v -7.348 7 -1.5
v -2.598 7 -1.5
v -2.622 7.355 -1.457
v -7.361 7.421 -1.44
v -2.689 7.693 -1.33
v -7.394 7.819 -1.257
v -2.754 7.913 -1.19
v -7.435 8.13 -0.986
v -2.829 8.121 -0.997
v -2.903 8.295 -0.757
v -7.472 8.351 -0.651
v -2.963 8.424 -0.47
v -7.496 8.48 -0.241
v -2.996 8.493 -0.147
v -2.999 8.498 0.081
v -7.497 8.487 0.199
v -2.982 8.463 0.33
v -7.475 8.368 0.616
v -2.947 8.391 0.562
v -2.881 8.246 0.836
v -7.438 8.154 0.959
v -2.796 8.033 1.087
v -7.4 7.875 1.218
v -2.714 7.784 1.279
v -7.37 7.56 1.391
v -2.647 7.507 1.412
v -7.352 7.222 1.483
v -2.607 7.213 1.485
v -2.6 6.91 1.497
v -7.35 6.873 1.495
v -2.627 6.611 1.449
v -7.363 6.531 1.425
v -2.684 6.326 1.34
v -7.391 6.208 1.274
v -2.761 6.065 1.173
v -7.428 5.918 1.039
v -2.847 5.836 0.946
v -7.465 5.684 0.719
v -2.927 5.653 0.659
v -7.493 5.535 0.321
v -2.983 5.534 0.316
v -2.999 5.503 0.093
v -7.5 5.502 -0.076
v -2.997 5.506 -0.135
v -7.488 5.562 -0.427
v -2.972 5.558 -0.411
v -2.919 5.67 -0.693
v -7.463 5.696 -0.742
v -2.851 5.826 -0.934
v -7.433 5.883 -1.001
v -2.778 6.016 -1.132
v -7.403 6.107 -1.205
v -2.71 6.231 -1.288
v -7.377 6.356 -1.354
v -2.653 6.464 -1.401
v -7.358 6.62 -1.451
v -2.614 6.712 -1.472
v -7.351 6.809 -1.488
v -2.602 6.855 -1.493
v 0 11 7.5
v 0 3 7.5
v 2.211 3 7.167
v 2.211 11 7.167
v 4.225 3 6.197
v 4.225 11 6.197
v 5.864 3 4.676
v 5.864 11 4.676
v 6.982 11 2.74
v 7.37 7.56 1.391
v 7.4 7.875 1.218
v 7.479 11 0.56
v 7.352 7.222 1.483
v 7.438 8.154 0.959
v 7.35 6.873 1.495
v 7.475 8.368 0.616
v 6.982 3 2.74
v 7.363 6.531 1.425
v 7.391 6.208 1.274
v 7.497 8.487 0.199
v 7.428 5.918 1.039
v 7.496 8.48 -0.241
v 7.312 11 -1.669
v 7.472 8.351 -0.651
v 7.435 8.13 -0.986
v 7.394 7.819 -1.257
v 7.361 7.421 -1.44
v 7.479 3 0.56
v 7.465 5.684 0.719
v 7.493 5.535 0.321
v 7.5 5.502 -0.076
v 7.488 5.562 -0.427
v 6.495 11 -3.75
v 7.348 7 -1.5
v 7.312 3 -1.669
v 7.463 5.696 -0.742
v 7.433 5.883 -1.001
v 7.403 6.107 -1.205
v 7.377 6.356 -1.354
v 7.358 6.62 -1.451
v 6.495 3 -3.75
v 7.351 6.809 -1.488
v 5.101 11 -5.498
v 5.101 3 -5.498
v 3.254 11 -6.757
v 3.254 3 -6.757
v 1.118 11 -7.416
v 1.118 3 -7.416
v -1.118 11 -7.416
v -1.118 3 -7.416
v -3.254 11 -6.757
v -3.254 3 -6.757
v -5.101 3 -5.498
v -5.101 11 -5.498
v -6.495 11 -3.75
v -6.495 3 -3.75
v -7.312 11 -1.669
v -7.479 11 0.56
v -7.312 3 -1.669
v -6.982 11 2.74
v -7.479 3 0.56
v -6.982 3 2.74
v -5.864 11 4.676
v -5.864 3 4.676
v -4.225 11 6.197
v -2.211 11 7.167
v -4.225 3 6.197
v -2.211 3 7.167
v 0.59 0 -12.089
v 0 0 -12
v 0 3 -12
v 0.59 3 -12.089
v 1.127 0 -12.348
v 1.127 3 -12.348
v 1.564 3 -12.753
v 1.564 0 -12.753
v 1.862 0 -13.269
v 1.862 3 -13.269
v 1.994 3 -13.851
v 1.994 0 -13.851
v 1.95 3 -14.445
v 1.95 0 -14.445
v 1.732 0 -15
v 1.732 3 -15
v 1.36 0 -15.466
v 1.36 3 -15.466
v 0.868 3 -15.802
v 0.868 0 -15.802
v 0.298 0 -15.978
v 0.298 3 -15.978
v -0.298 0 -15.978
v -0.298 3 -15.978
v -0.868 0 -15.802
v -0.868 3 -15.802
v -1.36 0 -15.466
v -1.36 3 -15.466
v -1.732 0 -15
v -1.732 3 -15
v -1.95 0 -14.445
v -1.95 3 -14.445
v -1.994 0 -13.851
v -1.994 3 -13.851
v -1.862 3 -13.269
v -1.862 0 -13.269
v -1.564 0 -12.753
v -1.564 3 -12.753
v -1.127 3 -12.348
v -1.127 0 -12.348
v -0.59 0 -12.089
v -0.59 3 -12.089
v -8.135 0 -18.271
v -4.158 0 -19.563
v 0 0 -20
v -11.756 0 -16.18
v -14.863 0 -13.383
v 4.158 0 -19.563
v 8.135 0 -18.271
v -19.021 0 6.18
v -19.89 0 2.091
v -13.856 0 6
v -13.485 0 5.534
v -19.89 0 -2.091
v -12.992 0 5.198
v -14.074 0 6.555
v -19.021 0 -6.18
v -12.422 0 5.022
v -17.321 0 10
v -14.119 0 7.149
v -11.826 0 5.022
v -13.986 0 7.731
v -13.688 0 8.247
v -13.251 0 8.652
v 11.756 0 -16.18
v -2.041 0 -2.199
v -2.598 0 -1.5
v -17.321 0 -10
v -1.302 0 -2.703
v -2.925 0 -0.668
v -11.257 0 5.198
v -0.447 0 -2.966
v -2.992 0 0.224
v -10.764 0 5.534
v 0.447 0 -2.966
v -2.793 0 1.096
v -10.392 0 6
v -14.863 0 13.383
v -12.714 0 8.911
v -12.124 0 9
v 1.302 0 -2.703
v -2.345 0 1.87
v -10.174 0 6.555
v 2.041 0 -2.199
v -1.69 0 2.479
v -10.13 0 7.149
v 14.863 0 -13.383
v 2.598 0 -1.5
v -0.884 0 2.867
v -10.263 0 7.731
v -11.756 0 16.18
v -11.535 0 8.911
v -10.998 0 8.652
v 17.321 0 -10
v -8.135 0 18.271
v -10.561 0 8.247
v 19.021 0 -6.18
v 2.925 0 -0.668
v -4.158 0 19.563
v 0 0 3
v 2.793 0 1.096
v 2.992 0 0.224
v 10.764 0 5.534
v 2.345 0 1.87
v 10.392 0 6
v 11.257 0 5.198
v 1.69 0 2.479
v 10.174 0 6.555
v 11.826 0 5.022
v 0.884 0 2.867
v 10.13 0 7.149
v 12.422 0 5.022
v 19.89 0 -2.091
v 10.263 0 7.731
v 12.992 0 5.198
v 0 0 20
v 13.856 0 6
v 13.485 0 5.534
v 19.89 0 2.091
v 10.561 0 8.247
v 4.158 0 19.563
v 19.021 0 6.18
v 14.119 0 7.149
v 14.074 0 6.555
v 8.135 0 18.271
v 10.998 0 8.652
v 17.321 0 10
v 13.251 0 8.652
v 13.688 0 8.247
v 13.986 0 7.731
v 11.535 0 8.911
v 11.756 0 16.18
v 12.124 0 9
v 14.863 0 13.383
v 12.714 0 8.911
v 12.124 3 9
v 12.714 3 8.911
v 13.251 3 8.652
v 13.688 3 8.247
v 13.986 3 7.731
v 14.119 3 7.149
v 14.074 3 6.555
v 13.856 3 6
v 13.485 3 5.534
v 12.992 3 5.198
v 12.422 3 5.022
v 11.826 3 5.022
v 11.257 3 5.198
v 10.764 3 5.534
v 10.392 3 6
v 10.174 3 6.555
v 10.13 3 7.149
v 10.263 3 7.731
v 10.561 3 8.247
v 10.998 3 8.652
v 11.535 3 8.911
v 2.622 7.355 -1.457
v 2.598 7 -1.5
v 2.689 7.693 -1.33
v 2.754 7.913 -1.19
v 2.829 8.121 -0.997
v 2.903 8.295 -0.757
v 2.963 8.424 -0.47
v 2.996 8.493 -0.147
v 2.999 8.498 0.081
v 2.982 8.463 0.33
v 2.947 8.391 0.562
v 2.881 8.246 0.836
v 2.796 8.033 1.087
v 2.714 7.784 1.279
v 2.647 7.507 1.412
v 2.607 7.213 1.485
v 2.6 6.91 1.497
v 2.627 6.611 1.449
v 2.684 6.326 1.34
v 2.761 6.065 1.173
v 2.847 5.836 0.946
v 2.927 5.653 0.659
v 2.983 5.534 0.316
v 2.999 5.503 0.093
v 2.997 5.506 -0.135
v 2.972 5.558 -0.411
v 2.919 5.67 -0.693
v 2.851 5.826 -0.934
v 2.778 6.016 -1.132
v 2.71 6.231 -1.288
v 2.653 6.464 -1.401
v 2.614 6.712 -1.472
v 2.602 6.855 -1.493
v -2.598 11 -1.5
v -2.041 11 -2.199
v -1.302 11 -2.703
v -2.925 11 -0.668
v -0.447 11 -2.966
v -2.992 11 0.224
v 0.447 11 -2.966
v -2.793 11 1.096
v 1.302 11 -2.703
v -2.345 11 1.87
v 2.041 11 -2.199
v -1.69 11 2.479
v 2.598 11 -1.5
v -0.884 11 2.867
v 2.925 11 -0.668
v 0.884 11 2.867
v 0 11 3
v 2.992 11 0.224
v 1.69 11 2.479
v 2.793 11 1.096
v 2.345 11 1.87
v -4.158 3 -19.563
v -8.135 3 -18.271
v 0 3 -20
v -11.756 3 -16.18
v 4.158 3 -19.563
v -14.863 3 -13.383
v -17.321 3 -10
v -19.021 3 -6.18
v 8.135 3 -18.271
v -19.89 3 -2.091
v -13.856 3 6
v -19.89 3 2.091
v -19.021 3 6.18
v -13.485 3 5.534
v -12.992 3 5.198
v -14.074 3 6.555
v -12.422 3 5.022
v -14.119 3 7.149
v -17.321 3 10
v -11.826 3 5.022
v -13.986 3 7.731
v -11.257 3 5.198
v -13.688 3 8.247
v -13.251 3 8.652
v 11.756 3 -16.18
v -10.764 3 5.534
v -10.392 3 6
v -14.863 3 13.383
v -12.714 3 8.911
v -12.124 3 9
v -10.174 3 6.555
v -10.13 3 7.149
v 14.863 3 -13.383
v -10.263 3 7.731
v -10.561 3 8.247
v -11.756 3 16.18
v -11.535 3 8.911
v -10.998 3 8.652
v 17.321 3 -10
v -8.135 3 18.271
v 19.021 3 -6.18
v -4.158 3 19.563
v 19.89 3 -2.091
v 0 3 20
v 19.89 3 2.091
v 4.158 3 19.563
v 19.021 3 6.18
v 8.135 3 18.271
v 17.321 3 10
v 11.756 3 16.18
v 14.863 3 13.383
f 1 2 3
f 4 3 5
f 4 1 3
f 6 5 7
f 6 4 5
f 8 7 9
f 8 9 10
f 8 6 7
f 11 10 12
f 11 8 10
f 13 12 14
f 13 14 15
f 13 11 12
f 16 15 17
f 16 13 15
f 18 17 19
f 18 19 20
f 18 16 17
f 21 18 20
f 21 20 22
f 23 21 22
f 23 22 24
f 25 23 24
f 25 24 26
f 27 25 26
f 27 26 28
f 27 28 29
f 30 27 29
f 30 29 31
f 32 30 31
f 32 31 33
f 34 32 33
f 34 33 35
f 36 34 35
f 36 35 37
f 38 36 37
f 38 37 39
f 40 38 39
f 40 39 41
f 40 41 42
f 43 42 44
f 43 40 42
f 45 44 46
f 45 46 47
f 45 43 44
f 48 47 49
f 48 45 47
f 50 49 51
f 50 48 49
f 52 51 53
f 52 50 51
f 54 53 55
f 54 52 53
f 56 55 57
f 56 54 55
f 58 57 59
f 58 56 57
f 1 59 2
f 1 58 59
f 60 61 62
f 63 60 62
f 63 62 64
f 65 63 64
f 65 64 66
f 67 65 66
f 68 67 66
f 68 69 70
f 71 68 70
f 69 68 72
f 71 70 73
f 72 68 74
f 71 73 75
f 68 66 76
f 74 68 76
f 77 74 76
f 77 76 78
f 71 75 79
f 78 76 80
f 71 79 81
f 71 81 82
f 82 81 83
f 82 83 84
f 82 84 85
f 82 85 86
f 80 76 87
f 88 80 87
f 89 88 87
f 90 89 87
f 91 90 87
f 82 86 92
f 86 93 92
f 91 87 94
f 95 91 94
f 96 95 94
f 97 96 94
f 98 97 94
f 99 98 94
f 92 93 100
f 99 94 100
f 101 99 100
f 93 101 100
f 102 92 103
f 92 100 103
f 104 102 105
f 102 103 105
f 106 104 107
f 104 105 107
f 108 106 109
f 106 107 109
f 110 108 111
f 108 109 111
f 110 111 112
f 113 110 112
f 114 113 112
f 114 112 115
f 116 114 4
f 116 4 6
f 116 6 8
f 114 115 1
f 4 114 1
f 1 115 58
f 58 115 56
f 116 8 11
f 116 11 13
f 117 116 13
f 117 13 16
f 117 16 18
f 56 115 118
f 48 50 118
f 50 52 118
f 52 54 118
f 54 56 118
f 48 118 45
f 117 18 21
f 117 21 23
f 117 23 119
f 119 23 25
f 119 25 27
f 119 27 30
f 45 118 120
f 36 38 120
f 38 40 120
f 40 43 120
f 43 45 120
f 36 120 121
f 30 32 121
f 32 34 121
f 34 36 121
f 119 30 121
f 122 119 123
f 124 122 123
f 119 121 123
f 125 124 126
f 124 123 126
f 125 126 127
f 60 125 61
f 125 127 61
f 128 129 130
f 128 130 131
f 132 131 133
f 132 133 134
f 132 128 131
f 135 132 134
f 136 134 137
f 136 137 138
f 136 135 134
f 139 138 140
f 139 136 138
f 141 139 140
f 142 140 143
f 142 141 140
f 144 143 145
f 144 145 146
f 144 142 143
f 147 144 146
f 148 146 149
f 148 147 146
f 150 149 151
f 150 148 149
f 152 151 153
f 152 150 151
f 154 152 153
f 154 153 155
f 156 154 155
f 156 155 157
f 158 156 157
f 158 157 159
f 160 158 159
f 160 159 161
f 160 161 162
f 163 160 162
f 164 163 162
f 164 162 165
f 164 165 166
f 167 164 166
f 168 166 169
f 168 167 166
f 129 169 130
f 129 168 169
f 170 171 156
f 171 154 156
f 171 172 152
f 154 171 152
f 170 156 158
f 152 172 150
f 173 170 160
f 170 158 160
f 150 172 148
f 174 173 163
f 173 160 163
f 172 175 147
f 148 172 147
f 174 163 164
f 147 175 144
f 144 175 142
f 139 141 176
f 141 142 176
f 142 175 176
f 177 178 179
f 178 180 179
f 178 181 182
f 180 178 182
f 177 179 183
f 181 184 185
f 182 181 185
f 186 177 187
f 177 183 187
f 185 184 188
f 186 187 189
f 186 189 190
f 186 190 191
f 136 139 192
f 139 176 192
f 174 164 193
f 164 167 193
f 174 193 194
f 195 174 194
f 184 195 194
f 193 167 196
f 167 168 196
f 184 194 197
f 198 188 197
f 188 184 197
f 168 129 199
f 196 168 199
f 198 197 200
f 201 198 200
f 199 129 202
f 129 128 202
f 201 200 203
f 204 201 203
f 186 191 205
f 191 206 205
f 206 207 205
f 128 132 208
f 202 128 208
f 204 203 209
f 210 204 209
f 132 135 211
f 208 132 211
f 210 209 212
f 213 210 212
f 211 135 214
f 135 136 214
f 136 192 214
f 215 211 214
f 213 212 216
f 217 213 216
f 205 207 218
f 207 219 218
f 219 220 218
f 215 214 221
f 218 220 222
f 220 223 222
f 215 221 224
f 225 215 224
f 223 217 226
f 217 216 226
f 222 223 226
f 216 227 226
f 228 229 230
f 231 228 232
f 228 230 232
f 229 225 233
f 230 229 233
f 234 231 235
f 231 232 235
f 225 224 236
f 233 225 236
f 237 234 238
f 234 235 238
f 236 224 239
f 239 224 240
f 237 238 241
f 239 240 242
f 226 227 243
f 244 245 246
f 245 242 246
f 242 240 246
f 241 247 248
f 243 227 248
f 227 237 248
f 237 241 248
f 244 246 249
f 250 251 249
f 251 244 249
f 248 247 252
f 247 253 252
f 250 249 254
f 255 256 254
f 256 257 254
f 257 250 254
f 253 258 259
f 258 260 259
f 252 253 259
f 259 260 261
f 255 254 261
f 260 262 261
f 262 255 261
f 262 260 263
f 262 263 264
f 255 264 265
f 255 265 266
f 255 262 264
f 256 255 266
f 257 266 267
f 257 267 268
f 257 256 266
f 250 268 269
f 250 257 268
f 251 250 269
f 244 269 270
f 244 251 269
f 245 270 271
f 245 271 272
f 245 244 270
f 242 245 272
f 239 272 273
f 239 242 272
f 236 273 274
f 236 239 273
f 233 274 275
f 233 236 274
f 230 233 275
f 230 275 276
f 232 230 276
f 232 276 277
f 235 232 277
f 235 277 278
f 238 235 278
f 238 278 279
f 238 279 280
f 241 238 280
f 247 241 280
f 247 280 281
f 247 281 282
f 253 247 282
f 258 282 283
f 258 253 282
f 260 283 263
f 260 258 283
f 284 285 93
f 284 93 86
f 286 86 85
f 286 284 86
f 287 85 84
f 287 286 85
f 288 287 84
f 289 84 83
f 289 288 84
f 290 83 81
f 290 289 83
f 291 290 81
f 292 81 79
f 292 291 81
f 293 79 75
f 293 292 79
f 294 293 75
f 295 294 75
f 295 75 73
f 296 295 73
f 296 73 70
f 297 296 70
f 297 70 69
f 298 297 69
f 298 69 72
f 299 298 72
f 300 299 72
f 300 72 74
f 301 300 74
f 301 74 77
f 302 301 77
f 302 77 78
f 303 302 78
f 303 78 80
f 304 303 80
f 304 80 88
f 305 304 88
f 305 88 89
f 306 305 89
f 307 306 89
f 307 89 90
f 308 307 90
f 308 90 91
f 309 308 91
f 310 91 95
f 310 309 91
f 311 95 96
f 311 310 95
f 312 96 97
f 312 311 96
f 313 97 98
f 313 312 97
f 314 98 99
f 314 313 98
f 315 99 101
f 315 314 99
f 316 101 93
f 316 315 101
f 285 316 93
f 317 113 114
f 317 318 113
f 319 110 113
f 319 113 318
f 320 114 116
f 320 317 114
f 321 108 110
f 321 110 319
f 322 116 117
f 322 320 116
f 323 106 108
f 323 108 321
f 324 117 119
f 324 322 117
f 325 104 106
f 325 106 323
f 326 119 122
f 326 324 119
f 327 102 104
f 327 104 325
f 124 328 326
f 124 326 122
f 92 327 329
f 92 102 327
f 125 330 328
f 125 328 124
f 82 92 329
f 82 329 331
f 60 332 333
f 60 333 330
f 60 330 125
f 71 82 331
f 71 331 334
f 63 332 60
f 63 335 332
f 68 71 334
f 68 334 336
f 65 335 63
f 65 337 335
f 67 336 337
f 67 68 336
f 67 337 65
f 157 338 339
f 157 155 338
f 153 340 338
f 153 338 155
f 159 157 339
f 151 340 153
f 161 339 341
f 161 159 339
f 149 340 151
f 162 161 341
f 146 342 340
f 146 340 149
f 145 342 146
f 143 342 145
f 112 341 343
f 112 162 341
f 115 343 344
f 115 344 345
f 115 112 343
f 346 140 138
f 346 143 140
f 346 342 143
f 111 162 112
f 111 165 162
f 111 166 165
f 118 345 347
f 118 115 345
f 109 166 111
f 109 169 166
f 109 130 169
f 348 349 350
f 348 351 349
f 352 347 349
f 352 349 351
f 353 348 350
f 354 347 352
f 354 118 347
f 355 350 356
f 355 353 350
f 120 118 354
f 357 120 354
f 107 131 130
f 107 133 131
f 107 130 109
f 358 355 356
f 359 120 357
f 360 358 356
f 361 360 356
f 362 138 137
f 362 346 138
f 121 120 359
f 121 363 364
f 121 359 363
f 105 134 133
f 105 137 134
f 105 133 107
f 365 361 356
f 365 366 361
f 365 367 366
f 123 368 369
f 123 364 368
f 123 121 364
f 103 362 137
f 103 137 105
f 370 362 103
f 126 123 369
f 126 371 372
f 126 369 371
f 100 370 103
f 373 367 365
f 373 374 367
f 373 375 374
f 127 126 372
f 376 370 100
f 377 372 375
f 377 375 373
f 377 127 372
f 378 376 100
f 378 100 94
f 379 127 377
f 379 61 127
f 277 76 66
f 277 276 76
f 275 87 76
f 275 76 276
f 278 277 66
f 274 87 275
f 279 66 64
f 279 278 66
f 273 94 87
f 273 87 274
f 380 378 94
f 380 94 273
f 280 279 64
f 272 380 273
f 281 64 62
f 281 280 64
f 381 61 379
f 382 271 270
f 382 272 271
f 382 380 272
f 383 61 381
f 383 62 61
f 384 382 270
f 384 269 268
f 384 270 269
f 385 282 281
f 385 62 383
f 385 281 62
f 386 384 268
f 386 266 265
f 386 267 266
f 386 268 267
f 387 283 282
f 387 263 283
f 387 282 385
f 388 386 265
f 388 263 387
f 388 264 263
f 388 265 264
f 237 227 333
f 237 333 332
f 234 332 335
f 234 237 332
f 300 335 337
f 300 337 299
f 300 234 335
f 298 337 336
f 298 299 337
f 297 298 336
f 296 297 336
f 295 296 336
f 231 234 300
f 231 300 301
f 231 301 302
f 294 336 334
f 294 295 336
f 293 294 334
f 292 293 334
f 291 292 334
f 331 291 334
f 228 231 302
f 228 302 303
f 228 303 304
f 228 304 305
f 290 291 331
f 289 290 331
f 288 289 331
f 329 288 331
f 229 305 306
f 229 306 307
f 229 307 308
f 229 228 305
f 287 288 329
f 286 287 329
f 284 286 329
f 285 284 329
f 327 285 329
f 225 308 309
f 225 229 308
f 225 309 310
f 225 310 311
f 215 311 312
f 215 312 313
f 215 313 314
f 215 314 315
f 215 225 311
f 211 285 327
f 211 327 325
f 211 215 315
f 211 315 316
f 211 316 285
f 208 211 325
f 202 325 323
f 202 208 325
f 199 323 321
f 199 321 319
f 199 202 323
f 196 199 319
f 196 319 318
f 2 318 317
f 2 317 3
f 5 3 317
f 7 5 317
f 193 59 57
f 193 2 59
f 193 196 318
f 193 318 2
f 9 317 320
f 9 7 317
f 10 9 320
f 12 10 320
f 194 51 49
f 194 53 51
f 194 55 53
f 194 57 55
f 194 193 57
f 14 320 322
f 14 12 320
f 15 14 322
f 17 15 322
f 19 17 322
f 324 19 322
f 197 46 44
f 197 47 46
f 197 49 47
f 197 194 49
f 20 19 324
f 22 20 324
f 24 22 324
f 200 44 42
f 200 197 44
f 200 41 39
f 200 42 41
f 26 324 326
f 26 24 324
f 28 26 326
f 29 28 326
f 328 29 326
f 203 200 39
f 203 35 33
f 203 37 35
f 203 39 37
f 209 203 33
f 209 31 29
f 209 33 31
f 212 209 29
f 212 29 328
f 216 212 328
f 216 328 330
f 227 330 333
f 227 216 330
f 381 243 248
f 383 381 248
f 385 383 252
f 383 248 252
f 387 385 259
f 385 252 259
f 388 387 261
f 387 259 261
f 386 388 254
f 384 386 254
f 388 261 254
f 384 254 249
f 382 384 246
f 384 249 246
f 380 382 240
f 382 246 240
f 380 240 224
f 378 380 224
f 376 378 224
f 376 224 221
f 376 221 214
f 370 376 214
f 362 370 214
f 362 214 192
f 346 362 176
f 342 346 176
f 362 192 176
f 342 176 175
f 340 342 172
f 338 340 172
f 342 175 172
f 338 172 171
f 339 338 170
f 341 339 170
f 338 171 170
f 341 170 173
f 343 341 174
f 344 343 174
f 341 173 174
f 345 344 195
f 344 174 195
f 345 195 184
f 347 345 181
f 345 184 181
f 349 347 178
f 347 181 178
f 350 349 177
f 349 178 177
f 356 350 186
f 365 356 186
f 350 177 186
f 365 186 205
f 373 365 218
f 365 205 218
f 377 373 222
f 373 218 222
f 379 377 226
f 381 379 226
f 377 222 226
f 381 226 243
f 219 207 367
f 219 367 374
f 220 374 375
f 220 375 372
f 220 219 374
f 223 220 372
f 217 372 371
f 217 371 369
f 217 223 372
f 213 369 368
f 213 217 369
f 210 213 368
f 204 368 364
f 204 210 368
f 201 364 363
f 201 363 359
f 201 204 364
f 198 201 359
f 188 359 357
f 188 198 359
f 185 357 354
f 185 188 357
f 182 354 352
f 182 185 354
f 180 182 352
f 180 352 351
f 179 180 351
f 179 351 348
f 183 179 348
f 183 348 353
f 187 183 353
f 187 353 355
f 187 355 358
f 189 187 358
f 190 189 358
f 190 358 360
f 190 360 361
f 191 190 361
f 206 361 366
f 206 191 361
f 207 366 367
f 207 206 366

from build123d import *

# Parameters (mm, degrees)
CROQUIS1_R                 = 20
CROQUIS1_R_2               = 2
CROQUIS1_R_3               = 3
SALIENTE_EXTRUIR1_DEPTH    = 3
CROQUIS2_R                 = 7.5
CROQUIS2_R_2               = 3
SALIENTE_EXTRUIR2_DEPTH    = 8
CORTAR_EXTRUIR1_DEPTH      = 31.347981811
CORTAR_EXTRUIR1_DEPTH_BACK = 31.347981811
CROQUIS3_R                 = 1.5


with BuildPart() as part:
    # Croquis1 → Saliente-Extruir1 (new body)
    with BuildSketch(Plane(origin=(0, 0, 0), x_dir=(1, 0, 0), z_dir=(0, 1, 0))):
        with Locations(Location((0, 0, 0), (0, 0, 270))):
            Circle(CROQUIS1_R)
        with Locations(Location((0, 14, 0), (0, 0, 270))):
            Circle(CROQUIS1_R_2, mode=Mode.SUBTRACT)
        with Locations(Location((12.124355653, -7, 0), (0, 0, 270))):
            Circle(CROQUIS1_R_2, mode=Mode.SUBTRACT)
        with Locations(Location((-12.124355653, -7, 0), (0, 0, 270))):
            Circle(CROQUIS1_R_2, mode=Mode.SUBTRACT)
        with Locations(Location((0, 0, 0), (0, 0, 270))):
            Circle(CROQUIS1_R_3, mode=Mode.SUBTRACT)
    extrude(amount=SALIENTE_EXTRUIR1_DEPTH)

    # Croquis2 → Saliente-Extruir2 (add)
    with BuildSketch(Plane(origin=(0, 3, 0), x_dir=(1, 0, 0), z_dir=(0, 1, 0))):
        with Locations(Location((0, 0, 0), (0, 0, 270))):
            Circle(CROQUIS2_R)
        with Locations(Location((0, 0, 0), (0, 0, 270))):
            Circle(CROQUIS2_R_2, mode=Mode.SUBTRACT)
    extrude(amount=SALIENTE_EXTRUIR2_DEPTH)

    # Croquis3 → Cortar-Extruir1 (cut, two sides: drawn at the far end of the back side and taken through both)
    with BuildSketch(Plane(origin=(0, 0, 0), x_dir=(0, 0, -1), z_dir=(1, 0, 0)).offset(-CORTAR_EXTRUIR1_DEPTH_BACK)):
        with Locations((0, 7)):
            Circle(CROQUIS3_R)
    extrude(amount=CORTAR_EXTRUIR1_DEPTH + CORTAR_EXTRUIR1_DEPTH_BACK, mode=Mode.SUBTRACT)


solid = part.part
